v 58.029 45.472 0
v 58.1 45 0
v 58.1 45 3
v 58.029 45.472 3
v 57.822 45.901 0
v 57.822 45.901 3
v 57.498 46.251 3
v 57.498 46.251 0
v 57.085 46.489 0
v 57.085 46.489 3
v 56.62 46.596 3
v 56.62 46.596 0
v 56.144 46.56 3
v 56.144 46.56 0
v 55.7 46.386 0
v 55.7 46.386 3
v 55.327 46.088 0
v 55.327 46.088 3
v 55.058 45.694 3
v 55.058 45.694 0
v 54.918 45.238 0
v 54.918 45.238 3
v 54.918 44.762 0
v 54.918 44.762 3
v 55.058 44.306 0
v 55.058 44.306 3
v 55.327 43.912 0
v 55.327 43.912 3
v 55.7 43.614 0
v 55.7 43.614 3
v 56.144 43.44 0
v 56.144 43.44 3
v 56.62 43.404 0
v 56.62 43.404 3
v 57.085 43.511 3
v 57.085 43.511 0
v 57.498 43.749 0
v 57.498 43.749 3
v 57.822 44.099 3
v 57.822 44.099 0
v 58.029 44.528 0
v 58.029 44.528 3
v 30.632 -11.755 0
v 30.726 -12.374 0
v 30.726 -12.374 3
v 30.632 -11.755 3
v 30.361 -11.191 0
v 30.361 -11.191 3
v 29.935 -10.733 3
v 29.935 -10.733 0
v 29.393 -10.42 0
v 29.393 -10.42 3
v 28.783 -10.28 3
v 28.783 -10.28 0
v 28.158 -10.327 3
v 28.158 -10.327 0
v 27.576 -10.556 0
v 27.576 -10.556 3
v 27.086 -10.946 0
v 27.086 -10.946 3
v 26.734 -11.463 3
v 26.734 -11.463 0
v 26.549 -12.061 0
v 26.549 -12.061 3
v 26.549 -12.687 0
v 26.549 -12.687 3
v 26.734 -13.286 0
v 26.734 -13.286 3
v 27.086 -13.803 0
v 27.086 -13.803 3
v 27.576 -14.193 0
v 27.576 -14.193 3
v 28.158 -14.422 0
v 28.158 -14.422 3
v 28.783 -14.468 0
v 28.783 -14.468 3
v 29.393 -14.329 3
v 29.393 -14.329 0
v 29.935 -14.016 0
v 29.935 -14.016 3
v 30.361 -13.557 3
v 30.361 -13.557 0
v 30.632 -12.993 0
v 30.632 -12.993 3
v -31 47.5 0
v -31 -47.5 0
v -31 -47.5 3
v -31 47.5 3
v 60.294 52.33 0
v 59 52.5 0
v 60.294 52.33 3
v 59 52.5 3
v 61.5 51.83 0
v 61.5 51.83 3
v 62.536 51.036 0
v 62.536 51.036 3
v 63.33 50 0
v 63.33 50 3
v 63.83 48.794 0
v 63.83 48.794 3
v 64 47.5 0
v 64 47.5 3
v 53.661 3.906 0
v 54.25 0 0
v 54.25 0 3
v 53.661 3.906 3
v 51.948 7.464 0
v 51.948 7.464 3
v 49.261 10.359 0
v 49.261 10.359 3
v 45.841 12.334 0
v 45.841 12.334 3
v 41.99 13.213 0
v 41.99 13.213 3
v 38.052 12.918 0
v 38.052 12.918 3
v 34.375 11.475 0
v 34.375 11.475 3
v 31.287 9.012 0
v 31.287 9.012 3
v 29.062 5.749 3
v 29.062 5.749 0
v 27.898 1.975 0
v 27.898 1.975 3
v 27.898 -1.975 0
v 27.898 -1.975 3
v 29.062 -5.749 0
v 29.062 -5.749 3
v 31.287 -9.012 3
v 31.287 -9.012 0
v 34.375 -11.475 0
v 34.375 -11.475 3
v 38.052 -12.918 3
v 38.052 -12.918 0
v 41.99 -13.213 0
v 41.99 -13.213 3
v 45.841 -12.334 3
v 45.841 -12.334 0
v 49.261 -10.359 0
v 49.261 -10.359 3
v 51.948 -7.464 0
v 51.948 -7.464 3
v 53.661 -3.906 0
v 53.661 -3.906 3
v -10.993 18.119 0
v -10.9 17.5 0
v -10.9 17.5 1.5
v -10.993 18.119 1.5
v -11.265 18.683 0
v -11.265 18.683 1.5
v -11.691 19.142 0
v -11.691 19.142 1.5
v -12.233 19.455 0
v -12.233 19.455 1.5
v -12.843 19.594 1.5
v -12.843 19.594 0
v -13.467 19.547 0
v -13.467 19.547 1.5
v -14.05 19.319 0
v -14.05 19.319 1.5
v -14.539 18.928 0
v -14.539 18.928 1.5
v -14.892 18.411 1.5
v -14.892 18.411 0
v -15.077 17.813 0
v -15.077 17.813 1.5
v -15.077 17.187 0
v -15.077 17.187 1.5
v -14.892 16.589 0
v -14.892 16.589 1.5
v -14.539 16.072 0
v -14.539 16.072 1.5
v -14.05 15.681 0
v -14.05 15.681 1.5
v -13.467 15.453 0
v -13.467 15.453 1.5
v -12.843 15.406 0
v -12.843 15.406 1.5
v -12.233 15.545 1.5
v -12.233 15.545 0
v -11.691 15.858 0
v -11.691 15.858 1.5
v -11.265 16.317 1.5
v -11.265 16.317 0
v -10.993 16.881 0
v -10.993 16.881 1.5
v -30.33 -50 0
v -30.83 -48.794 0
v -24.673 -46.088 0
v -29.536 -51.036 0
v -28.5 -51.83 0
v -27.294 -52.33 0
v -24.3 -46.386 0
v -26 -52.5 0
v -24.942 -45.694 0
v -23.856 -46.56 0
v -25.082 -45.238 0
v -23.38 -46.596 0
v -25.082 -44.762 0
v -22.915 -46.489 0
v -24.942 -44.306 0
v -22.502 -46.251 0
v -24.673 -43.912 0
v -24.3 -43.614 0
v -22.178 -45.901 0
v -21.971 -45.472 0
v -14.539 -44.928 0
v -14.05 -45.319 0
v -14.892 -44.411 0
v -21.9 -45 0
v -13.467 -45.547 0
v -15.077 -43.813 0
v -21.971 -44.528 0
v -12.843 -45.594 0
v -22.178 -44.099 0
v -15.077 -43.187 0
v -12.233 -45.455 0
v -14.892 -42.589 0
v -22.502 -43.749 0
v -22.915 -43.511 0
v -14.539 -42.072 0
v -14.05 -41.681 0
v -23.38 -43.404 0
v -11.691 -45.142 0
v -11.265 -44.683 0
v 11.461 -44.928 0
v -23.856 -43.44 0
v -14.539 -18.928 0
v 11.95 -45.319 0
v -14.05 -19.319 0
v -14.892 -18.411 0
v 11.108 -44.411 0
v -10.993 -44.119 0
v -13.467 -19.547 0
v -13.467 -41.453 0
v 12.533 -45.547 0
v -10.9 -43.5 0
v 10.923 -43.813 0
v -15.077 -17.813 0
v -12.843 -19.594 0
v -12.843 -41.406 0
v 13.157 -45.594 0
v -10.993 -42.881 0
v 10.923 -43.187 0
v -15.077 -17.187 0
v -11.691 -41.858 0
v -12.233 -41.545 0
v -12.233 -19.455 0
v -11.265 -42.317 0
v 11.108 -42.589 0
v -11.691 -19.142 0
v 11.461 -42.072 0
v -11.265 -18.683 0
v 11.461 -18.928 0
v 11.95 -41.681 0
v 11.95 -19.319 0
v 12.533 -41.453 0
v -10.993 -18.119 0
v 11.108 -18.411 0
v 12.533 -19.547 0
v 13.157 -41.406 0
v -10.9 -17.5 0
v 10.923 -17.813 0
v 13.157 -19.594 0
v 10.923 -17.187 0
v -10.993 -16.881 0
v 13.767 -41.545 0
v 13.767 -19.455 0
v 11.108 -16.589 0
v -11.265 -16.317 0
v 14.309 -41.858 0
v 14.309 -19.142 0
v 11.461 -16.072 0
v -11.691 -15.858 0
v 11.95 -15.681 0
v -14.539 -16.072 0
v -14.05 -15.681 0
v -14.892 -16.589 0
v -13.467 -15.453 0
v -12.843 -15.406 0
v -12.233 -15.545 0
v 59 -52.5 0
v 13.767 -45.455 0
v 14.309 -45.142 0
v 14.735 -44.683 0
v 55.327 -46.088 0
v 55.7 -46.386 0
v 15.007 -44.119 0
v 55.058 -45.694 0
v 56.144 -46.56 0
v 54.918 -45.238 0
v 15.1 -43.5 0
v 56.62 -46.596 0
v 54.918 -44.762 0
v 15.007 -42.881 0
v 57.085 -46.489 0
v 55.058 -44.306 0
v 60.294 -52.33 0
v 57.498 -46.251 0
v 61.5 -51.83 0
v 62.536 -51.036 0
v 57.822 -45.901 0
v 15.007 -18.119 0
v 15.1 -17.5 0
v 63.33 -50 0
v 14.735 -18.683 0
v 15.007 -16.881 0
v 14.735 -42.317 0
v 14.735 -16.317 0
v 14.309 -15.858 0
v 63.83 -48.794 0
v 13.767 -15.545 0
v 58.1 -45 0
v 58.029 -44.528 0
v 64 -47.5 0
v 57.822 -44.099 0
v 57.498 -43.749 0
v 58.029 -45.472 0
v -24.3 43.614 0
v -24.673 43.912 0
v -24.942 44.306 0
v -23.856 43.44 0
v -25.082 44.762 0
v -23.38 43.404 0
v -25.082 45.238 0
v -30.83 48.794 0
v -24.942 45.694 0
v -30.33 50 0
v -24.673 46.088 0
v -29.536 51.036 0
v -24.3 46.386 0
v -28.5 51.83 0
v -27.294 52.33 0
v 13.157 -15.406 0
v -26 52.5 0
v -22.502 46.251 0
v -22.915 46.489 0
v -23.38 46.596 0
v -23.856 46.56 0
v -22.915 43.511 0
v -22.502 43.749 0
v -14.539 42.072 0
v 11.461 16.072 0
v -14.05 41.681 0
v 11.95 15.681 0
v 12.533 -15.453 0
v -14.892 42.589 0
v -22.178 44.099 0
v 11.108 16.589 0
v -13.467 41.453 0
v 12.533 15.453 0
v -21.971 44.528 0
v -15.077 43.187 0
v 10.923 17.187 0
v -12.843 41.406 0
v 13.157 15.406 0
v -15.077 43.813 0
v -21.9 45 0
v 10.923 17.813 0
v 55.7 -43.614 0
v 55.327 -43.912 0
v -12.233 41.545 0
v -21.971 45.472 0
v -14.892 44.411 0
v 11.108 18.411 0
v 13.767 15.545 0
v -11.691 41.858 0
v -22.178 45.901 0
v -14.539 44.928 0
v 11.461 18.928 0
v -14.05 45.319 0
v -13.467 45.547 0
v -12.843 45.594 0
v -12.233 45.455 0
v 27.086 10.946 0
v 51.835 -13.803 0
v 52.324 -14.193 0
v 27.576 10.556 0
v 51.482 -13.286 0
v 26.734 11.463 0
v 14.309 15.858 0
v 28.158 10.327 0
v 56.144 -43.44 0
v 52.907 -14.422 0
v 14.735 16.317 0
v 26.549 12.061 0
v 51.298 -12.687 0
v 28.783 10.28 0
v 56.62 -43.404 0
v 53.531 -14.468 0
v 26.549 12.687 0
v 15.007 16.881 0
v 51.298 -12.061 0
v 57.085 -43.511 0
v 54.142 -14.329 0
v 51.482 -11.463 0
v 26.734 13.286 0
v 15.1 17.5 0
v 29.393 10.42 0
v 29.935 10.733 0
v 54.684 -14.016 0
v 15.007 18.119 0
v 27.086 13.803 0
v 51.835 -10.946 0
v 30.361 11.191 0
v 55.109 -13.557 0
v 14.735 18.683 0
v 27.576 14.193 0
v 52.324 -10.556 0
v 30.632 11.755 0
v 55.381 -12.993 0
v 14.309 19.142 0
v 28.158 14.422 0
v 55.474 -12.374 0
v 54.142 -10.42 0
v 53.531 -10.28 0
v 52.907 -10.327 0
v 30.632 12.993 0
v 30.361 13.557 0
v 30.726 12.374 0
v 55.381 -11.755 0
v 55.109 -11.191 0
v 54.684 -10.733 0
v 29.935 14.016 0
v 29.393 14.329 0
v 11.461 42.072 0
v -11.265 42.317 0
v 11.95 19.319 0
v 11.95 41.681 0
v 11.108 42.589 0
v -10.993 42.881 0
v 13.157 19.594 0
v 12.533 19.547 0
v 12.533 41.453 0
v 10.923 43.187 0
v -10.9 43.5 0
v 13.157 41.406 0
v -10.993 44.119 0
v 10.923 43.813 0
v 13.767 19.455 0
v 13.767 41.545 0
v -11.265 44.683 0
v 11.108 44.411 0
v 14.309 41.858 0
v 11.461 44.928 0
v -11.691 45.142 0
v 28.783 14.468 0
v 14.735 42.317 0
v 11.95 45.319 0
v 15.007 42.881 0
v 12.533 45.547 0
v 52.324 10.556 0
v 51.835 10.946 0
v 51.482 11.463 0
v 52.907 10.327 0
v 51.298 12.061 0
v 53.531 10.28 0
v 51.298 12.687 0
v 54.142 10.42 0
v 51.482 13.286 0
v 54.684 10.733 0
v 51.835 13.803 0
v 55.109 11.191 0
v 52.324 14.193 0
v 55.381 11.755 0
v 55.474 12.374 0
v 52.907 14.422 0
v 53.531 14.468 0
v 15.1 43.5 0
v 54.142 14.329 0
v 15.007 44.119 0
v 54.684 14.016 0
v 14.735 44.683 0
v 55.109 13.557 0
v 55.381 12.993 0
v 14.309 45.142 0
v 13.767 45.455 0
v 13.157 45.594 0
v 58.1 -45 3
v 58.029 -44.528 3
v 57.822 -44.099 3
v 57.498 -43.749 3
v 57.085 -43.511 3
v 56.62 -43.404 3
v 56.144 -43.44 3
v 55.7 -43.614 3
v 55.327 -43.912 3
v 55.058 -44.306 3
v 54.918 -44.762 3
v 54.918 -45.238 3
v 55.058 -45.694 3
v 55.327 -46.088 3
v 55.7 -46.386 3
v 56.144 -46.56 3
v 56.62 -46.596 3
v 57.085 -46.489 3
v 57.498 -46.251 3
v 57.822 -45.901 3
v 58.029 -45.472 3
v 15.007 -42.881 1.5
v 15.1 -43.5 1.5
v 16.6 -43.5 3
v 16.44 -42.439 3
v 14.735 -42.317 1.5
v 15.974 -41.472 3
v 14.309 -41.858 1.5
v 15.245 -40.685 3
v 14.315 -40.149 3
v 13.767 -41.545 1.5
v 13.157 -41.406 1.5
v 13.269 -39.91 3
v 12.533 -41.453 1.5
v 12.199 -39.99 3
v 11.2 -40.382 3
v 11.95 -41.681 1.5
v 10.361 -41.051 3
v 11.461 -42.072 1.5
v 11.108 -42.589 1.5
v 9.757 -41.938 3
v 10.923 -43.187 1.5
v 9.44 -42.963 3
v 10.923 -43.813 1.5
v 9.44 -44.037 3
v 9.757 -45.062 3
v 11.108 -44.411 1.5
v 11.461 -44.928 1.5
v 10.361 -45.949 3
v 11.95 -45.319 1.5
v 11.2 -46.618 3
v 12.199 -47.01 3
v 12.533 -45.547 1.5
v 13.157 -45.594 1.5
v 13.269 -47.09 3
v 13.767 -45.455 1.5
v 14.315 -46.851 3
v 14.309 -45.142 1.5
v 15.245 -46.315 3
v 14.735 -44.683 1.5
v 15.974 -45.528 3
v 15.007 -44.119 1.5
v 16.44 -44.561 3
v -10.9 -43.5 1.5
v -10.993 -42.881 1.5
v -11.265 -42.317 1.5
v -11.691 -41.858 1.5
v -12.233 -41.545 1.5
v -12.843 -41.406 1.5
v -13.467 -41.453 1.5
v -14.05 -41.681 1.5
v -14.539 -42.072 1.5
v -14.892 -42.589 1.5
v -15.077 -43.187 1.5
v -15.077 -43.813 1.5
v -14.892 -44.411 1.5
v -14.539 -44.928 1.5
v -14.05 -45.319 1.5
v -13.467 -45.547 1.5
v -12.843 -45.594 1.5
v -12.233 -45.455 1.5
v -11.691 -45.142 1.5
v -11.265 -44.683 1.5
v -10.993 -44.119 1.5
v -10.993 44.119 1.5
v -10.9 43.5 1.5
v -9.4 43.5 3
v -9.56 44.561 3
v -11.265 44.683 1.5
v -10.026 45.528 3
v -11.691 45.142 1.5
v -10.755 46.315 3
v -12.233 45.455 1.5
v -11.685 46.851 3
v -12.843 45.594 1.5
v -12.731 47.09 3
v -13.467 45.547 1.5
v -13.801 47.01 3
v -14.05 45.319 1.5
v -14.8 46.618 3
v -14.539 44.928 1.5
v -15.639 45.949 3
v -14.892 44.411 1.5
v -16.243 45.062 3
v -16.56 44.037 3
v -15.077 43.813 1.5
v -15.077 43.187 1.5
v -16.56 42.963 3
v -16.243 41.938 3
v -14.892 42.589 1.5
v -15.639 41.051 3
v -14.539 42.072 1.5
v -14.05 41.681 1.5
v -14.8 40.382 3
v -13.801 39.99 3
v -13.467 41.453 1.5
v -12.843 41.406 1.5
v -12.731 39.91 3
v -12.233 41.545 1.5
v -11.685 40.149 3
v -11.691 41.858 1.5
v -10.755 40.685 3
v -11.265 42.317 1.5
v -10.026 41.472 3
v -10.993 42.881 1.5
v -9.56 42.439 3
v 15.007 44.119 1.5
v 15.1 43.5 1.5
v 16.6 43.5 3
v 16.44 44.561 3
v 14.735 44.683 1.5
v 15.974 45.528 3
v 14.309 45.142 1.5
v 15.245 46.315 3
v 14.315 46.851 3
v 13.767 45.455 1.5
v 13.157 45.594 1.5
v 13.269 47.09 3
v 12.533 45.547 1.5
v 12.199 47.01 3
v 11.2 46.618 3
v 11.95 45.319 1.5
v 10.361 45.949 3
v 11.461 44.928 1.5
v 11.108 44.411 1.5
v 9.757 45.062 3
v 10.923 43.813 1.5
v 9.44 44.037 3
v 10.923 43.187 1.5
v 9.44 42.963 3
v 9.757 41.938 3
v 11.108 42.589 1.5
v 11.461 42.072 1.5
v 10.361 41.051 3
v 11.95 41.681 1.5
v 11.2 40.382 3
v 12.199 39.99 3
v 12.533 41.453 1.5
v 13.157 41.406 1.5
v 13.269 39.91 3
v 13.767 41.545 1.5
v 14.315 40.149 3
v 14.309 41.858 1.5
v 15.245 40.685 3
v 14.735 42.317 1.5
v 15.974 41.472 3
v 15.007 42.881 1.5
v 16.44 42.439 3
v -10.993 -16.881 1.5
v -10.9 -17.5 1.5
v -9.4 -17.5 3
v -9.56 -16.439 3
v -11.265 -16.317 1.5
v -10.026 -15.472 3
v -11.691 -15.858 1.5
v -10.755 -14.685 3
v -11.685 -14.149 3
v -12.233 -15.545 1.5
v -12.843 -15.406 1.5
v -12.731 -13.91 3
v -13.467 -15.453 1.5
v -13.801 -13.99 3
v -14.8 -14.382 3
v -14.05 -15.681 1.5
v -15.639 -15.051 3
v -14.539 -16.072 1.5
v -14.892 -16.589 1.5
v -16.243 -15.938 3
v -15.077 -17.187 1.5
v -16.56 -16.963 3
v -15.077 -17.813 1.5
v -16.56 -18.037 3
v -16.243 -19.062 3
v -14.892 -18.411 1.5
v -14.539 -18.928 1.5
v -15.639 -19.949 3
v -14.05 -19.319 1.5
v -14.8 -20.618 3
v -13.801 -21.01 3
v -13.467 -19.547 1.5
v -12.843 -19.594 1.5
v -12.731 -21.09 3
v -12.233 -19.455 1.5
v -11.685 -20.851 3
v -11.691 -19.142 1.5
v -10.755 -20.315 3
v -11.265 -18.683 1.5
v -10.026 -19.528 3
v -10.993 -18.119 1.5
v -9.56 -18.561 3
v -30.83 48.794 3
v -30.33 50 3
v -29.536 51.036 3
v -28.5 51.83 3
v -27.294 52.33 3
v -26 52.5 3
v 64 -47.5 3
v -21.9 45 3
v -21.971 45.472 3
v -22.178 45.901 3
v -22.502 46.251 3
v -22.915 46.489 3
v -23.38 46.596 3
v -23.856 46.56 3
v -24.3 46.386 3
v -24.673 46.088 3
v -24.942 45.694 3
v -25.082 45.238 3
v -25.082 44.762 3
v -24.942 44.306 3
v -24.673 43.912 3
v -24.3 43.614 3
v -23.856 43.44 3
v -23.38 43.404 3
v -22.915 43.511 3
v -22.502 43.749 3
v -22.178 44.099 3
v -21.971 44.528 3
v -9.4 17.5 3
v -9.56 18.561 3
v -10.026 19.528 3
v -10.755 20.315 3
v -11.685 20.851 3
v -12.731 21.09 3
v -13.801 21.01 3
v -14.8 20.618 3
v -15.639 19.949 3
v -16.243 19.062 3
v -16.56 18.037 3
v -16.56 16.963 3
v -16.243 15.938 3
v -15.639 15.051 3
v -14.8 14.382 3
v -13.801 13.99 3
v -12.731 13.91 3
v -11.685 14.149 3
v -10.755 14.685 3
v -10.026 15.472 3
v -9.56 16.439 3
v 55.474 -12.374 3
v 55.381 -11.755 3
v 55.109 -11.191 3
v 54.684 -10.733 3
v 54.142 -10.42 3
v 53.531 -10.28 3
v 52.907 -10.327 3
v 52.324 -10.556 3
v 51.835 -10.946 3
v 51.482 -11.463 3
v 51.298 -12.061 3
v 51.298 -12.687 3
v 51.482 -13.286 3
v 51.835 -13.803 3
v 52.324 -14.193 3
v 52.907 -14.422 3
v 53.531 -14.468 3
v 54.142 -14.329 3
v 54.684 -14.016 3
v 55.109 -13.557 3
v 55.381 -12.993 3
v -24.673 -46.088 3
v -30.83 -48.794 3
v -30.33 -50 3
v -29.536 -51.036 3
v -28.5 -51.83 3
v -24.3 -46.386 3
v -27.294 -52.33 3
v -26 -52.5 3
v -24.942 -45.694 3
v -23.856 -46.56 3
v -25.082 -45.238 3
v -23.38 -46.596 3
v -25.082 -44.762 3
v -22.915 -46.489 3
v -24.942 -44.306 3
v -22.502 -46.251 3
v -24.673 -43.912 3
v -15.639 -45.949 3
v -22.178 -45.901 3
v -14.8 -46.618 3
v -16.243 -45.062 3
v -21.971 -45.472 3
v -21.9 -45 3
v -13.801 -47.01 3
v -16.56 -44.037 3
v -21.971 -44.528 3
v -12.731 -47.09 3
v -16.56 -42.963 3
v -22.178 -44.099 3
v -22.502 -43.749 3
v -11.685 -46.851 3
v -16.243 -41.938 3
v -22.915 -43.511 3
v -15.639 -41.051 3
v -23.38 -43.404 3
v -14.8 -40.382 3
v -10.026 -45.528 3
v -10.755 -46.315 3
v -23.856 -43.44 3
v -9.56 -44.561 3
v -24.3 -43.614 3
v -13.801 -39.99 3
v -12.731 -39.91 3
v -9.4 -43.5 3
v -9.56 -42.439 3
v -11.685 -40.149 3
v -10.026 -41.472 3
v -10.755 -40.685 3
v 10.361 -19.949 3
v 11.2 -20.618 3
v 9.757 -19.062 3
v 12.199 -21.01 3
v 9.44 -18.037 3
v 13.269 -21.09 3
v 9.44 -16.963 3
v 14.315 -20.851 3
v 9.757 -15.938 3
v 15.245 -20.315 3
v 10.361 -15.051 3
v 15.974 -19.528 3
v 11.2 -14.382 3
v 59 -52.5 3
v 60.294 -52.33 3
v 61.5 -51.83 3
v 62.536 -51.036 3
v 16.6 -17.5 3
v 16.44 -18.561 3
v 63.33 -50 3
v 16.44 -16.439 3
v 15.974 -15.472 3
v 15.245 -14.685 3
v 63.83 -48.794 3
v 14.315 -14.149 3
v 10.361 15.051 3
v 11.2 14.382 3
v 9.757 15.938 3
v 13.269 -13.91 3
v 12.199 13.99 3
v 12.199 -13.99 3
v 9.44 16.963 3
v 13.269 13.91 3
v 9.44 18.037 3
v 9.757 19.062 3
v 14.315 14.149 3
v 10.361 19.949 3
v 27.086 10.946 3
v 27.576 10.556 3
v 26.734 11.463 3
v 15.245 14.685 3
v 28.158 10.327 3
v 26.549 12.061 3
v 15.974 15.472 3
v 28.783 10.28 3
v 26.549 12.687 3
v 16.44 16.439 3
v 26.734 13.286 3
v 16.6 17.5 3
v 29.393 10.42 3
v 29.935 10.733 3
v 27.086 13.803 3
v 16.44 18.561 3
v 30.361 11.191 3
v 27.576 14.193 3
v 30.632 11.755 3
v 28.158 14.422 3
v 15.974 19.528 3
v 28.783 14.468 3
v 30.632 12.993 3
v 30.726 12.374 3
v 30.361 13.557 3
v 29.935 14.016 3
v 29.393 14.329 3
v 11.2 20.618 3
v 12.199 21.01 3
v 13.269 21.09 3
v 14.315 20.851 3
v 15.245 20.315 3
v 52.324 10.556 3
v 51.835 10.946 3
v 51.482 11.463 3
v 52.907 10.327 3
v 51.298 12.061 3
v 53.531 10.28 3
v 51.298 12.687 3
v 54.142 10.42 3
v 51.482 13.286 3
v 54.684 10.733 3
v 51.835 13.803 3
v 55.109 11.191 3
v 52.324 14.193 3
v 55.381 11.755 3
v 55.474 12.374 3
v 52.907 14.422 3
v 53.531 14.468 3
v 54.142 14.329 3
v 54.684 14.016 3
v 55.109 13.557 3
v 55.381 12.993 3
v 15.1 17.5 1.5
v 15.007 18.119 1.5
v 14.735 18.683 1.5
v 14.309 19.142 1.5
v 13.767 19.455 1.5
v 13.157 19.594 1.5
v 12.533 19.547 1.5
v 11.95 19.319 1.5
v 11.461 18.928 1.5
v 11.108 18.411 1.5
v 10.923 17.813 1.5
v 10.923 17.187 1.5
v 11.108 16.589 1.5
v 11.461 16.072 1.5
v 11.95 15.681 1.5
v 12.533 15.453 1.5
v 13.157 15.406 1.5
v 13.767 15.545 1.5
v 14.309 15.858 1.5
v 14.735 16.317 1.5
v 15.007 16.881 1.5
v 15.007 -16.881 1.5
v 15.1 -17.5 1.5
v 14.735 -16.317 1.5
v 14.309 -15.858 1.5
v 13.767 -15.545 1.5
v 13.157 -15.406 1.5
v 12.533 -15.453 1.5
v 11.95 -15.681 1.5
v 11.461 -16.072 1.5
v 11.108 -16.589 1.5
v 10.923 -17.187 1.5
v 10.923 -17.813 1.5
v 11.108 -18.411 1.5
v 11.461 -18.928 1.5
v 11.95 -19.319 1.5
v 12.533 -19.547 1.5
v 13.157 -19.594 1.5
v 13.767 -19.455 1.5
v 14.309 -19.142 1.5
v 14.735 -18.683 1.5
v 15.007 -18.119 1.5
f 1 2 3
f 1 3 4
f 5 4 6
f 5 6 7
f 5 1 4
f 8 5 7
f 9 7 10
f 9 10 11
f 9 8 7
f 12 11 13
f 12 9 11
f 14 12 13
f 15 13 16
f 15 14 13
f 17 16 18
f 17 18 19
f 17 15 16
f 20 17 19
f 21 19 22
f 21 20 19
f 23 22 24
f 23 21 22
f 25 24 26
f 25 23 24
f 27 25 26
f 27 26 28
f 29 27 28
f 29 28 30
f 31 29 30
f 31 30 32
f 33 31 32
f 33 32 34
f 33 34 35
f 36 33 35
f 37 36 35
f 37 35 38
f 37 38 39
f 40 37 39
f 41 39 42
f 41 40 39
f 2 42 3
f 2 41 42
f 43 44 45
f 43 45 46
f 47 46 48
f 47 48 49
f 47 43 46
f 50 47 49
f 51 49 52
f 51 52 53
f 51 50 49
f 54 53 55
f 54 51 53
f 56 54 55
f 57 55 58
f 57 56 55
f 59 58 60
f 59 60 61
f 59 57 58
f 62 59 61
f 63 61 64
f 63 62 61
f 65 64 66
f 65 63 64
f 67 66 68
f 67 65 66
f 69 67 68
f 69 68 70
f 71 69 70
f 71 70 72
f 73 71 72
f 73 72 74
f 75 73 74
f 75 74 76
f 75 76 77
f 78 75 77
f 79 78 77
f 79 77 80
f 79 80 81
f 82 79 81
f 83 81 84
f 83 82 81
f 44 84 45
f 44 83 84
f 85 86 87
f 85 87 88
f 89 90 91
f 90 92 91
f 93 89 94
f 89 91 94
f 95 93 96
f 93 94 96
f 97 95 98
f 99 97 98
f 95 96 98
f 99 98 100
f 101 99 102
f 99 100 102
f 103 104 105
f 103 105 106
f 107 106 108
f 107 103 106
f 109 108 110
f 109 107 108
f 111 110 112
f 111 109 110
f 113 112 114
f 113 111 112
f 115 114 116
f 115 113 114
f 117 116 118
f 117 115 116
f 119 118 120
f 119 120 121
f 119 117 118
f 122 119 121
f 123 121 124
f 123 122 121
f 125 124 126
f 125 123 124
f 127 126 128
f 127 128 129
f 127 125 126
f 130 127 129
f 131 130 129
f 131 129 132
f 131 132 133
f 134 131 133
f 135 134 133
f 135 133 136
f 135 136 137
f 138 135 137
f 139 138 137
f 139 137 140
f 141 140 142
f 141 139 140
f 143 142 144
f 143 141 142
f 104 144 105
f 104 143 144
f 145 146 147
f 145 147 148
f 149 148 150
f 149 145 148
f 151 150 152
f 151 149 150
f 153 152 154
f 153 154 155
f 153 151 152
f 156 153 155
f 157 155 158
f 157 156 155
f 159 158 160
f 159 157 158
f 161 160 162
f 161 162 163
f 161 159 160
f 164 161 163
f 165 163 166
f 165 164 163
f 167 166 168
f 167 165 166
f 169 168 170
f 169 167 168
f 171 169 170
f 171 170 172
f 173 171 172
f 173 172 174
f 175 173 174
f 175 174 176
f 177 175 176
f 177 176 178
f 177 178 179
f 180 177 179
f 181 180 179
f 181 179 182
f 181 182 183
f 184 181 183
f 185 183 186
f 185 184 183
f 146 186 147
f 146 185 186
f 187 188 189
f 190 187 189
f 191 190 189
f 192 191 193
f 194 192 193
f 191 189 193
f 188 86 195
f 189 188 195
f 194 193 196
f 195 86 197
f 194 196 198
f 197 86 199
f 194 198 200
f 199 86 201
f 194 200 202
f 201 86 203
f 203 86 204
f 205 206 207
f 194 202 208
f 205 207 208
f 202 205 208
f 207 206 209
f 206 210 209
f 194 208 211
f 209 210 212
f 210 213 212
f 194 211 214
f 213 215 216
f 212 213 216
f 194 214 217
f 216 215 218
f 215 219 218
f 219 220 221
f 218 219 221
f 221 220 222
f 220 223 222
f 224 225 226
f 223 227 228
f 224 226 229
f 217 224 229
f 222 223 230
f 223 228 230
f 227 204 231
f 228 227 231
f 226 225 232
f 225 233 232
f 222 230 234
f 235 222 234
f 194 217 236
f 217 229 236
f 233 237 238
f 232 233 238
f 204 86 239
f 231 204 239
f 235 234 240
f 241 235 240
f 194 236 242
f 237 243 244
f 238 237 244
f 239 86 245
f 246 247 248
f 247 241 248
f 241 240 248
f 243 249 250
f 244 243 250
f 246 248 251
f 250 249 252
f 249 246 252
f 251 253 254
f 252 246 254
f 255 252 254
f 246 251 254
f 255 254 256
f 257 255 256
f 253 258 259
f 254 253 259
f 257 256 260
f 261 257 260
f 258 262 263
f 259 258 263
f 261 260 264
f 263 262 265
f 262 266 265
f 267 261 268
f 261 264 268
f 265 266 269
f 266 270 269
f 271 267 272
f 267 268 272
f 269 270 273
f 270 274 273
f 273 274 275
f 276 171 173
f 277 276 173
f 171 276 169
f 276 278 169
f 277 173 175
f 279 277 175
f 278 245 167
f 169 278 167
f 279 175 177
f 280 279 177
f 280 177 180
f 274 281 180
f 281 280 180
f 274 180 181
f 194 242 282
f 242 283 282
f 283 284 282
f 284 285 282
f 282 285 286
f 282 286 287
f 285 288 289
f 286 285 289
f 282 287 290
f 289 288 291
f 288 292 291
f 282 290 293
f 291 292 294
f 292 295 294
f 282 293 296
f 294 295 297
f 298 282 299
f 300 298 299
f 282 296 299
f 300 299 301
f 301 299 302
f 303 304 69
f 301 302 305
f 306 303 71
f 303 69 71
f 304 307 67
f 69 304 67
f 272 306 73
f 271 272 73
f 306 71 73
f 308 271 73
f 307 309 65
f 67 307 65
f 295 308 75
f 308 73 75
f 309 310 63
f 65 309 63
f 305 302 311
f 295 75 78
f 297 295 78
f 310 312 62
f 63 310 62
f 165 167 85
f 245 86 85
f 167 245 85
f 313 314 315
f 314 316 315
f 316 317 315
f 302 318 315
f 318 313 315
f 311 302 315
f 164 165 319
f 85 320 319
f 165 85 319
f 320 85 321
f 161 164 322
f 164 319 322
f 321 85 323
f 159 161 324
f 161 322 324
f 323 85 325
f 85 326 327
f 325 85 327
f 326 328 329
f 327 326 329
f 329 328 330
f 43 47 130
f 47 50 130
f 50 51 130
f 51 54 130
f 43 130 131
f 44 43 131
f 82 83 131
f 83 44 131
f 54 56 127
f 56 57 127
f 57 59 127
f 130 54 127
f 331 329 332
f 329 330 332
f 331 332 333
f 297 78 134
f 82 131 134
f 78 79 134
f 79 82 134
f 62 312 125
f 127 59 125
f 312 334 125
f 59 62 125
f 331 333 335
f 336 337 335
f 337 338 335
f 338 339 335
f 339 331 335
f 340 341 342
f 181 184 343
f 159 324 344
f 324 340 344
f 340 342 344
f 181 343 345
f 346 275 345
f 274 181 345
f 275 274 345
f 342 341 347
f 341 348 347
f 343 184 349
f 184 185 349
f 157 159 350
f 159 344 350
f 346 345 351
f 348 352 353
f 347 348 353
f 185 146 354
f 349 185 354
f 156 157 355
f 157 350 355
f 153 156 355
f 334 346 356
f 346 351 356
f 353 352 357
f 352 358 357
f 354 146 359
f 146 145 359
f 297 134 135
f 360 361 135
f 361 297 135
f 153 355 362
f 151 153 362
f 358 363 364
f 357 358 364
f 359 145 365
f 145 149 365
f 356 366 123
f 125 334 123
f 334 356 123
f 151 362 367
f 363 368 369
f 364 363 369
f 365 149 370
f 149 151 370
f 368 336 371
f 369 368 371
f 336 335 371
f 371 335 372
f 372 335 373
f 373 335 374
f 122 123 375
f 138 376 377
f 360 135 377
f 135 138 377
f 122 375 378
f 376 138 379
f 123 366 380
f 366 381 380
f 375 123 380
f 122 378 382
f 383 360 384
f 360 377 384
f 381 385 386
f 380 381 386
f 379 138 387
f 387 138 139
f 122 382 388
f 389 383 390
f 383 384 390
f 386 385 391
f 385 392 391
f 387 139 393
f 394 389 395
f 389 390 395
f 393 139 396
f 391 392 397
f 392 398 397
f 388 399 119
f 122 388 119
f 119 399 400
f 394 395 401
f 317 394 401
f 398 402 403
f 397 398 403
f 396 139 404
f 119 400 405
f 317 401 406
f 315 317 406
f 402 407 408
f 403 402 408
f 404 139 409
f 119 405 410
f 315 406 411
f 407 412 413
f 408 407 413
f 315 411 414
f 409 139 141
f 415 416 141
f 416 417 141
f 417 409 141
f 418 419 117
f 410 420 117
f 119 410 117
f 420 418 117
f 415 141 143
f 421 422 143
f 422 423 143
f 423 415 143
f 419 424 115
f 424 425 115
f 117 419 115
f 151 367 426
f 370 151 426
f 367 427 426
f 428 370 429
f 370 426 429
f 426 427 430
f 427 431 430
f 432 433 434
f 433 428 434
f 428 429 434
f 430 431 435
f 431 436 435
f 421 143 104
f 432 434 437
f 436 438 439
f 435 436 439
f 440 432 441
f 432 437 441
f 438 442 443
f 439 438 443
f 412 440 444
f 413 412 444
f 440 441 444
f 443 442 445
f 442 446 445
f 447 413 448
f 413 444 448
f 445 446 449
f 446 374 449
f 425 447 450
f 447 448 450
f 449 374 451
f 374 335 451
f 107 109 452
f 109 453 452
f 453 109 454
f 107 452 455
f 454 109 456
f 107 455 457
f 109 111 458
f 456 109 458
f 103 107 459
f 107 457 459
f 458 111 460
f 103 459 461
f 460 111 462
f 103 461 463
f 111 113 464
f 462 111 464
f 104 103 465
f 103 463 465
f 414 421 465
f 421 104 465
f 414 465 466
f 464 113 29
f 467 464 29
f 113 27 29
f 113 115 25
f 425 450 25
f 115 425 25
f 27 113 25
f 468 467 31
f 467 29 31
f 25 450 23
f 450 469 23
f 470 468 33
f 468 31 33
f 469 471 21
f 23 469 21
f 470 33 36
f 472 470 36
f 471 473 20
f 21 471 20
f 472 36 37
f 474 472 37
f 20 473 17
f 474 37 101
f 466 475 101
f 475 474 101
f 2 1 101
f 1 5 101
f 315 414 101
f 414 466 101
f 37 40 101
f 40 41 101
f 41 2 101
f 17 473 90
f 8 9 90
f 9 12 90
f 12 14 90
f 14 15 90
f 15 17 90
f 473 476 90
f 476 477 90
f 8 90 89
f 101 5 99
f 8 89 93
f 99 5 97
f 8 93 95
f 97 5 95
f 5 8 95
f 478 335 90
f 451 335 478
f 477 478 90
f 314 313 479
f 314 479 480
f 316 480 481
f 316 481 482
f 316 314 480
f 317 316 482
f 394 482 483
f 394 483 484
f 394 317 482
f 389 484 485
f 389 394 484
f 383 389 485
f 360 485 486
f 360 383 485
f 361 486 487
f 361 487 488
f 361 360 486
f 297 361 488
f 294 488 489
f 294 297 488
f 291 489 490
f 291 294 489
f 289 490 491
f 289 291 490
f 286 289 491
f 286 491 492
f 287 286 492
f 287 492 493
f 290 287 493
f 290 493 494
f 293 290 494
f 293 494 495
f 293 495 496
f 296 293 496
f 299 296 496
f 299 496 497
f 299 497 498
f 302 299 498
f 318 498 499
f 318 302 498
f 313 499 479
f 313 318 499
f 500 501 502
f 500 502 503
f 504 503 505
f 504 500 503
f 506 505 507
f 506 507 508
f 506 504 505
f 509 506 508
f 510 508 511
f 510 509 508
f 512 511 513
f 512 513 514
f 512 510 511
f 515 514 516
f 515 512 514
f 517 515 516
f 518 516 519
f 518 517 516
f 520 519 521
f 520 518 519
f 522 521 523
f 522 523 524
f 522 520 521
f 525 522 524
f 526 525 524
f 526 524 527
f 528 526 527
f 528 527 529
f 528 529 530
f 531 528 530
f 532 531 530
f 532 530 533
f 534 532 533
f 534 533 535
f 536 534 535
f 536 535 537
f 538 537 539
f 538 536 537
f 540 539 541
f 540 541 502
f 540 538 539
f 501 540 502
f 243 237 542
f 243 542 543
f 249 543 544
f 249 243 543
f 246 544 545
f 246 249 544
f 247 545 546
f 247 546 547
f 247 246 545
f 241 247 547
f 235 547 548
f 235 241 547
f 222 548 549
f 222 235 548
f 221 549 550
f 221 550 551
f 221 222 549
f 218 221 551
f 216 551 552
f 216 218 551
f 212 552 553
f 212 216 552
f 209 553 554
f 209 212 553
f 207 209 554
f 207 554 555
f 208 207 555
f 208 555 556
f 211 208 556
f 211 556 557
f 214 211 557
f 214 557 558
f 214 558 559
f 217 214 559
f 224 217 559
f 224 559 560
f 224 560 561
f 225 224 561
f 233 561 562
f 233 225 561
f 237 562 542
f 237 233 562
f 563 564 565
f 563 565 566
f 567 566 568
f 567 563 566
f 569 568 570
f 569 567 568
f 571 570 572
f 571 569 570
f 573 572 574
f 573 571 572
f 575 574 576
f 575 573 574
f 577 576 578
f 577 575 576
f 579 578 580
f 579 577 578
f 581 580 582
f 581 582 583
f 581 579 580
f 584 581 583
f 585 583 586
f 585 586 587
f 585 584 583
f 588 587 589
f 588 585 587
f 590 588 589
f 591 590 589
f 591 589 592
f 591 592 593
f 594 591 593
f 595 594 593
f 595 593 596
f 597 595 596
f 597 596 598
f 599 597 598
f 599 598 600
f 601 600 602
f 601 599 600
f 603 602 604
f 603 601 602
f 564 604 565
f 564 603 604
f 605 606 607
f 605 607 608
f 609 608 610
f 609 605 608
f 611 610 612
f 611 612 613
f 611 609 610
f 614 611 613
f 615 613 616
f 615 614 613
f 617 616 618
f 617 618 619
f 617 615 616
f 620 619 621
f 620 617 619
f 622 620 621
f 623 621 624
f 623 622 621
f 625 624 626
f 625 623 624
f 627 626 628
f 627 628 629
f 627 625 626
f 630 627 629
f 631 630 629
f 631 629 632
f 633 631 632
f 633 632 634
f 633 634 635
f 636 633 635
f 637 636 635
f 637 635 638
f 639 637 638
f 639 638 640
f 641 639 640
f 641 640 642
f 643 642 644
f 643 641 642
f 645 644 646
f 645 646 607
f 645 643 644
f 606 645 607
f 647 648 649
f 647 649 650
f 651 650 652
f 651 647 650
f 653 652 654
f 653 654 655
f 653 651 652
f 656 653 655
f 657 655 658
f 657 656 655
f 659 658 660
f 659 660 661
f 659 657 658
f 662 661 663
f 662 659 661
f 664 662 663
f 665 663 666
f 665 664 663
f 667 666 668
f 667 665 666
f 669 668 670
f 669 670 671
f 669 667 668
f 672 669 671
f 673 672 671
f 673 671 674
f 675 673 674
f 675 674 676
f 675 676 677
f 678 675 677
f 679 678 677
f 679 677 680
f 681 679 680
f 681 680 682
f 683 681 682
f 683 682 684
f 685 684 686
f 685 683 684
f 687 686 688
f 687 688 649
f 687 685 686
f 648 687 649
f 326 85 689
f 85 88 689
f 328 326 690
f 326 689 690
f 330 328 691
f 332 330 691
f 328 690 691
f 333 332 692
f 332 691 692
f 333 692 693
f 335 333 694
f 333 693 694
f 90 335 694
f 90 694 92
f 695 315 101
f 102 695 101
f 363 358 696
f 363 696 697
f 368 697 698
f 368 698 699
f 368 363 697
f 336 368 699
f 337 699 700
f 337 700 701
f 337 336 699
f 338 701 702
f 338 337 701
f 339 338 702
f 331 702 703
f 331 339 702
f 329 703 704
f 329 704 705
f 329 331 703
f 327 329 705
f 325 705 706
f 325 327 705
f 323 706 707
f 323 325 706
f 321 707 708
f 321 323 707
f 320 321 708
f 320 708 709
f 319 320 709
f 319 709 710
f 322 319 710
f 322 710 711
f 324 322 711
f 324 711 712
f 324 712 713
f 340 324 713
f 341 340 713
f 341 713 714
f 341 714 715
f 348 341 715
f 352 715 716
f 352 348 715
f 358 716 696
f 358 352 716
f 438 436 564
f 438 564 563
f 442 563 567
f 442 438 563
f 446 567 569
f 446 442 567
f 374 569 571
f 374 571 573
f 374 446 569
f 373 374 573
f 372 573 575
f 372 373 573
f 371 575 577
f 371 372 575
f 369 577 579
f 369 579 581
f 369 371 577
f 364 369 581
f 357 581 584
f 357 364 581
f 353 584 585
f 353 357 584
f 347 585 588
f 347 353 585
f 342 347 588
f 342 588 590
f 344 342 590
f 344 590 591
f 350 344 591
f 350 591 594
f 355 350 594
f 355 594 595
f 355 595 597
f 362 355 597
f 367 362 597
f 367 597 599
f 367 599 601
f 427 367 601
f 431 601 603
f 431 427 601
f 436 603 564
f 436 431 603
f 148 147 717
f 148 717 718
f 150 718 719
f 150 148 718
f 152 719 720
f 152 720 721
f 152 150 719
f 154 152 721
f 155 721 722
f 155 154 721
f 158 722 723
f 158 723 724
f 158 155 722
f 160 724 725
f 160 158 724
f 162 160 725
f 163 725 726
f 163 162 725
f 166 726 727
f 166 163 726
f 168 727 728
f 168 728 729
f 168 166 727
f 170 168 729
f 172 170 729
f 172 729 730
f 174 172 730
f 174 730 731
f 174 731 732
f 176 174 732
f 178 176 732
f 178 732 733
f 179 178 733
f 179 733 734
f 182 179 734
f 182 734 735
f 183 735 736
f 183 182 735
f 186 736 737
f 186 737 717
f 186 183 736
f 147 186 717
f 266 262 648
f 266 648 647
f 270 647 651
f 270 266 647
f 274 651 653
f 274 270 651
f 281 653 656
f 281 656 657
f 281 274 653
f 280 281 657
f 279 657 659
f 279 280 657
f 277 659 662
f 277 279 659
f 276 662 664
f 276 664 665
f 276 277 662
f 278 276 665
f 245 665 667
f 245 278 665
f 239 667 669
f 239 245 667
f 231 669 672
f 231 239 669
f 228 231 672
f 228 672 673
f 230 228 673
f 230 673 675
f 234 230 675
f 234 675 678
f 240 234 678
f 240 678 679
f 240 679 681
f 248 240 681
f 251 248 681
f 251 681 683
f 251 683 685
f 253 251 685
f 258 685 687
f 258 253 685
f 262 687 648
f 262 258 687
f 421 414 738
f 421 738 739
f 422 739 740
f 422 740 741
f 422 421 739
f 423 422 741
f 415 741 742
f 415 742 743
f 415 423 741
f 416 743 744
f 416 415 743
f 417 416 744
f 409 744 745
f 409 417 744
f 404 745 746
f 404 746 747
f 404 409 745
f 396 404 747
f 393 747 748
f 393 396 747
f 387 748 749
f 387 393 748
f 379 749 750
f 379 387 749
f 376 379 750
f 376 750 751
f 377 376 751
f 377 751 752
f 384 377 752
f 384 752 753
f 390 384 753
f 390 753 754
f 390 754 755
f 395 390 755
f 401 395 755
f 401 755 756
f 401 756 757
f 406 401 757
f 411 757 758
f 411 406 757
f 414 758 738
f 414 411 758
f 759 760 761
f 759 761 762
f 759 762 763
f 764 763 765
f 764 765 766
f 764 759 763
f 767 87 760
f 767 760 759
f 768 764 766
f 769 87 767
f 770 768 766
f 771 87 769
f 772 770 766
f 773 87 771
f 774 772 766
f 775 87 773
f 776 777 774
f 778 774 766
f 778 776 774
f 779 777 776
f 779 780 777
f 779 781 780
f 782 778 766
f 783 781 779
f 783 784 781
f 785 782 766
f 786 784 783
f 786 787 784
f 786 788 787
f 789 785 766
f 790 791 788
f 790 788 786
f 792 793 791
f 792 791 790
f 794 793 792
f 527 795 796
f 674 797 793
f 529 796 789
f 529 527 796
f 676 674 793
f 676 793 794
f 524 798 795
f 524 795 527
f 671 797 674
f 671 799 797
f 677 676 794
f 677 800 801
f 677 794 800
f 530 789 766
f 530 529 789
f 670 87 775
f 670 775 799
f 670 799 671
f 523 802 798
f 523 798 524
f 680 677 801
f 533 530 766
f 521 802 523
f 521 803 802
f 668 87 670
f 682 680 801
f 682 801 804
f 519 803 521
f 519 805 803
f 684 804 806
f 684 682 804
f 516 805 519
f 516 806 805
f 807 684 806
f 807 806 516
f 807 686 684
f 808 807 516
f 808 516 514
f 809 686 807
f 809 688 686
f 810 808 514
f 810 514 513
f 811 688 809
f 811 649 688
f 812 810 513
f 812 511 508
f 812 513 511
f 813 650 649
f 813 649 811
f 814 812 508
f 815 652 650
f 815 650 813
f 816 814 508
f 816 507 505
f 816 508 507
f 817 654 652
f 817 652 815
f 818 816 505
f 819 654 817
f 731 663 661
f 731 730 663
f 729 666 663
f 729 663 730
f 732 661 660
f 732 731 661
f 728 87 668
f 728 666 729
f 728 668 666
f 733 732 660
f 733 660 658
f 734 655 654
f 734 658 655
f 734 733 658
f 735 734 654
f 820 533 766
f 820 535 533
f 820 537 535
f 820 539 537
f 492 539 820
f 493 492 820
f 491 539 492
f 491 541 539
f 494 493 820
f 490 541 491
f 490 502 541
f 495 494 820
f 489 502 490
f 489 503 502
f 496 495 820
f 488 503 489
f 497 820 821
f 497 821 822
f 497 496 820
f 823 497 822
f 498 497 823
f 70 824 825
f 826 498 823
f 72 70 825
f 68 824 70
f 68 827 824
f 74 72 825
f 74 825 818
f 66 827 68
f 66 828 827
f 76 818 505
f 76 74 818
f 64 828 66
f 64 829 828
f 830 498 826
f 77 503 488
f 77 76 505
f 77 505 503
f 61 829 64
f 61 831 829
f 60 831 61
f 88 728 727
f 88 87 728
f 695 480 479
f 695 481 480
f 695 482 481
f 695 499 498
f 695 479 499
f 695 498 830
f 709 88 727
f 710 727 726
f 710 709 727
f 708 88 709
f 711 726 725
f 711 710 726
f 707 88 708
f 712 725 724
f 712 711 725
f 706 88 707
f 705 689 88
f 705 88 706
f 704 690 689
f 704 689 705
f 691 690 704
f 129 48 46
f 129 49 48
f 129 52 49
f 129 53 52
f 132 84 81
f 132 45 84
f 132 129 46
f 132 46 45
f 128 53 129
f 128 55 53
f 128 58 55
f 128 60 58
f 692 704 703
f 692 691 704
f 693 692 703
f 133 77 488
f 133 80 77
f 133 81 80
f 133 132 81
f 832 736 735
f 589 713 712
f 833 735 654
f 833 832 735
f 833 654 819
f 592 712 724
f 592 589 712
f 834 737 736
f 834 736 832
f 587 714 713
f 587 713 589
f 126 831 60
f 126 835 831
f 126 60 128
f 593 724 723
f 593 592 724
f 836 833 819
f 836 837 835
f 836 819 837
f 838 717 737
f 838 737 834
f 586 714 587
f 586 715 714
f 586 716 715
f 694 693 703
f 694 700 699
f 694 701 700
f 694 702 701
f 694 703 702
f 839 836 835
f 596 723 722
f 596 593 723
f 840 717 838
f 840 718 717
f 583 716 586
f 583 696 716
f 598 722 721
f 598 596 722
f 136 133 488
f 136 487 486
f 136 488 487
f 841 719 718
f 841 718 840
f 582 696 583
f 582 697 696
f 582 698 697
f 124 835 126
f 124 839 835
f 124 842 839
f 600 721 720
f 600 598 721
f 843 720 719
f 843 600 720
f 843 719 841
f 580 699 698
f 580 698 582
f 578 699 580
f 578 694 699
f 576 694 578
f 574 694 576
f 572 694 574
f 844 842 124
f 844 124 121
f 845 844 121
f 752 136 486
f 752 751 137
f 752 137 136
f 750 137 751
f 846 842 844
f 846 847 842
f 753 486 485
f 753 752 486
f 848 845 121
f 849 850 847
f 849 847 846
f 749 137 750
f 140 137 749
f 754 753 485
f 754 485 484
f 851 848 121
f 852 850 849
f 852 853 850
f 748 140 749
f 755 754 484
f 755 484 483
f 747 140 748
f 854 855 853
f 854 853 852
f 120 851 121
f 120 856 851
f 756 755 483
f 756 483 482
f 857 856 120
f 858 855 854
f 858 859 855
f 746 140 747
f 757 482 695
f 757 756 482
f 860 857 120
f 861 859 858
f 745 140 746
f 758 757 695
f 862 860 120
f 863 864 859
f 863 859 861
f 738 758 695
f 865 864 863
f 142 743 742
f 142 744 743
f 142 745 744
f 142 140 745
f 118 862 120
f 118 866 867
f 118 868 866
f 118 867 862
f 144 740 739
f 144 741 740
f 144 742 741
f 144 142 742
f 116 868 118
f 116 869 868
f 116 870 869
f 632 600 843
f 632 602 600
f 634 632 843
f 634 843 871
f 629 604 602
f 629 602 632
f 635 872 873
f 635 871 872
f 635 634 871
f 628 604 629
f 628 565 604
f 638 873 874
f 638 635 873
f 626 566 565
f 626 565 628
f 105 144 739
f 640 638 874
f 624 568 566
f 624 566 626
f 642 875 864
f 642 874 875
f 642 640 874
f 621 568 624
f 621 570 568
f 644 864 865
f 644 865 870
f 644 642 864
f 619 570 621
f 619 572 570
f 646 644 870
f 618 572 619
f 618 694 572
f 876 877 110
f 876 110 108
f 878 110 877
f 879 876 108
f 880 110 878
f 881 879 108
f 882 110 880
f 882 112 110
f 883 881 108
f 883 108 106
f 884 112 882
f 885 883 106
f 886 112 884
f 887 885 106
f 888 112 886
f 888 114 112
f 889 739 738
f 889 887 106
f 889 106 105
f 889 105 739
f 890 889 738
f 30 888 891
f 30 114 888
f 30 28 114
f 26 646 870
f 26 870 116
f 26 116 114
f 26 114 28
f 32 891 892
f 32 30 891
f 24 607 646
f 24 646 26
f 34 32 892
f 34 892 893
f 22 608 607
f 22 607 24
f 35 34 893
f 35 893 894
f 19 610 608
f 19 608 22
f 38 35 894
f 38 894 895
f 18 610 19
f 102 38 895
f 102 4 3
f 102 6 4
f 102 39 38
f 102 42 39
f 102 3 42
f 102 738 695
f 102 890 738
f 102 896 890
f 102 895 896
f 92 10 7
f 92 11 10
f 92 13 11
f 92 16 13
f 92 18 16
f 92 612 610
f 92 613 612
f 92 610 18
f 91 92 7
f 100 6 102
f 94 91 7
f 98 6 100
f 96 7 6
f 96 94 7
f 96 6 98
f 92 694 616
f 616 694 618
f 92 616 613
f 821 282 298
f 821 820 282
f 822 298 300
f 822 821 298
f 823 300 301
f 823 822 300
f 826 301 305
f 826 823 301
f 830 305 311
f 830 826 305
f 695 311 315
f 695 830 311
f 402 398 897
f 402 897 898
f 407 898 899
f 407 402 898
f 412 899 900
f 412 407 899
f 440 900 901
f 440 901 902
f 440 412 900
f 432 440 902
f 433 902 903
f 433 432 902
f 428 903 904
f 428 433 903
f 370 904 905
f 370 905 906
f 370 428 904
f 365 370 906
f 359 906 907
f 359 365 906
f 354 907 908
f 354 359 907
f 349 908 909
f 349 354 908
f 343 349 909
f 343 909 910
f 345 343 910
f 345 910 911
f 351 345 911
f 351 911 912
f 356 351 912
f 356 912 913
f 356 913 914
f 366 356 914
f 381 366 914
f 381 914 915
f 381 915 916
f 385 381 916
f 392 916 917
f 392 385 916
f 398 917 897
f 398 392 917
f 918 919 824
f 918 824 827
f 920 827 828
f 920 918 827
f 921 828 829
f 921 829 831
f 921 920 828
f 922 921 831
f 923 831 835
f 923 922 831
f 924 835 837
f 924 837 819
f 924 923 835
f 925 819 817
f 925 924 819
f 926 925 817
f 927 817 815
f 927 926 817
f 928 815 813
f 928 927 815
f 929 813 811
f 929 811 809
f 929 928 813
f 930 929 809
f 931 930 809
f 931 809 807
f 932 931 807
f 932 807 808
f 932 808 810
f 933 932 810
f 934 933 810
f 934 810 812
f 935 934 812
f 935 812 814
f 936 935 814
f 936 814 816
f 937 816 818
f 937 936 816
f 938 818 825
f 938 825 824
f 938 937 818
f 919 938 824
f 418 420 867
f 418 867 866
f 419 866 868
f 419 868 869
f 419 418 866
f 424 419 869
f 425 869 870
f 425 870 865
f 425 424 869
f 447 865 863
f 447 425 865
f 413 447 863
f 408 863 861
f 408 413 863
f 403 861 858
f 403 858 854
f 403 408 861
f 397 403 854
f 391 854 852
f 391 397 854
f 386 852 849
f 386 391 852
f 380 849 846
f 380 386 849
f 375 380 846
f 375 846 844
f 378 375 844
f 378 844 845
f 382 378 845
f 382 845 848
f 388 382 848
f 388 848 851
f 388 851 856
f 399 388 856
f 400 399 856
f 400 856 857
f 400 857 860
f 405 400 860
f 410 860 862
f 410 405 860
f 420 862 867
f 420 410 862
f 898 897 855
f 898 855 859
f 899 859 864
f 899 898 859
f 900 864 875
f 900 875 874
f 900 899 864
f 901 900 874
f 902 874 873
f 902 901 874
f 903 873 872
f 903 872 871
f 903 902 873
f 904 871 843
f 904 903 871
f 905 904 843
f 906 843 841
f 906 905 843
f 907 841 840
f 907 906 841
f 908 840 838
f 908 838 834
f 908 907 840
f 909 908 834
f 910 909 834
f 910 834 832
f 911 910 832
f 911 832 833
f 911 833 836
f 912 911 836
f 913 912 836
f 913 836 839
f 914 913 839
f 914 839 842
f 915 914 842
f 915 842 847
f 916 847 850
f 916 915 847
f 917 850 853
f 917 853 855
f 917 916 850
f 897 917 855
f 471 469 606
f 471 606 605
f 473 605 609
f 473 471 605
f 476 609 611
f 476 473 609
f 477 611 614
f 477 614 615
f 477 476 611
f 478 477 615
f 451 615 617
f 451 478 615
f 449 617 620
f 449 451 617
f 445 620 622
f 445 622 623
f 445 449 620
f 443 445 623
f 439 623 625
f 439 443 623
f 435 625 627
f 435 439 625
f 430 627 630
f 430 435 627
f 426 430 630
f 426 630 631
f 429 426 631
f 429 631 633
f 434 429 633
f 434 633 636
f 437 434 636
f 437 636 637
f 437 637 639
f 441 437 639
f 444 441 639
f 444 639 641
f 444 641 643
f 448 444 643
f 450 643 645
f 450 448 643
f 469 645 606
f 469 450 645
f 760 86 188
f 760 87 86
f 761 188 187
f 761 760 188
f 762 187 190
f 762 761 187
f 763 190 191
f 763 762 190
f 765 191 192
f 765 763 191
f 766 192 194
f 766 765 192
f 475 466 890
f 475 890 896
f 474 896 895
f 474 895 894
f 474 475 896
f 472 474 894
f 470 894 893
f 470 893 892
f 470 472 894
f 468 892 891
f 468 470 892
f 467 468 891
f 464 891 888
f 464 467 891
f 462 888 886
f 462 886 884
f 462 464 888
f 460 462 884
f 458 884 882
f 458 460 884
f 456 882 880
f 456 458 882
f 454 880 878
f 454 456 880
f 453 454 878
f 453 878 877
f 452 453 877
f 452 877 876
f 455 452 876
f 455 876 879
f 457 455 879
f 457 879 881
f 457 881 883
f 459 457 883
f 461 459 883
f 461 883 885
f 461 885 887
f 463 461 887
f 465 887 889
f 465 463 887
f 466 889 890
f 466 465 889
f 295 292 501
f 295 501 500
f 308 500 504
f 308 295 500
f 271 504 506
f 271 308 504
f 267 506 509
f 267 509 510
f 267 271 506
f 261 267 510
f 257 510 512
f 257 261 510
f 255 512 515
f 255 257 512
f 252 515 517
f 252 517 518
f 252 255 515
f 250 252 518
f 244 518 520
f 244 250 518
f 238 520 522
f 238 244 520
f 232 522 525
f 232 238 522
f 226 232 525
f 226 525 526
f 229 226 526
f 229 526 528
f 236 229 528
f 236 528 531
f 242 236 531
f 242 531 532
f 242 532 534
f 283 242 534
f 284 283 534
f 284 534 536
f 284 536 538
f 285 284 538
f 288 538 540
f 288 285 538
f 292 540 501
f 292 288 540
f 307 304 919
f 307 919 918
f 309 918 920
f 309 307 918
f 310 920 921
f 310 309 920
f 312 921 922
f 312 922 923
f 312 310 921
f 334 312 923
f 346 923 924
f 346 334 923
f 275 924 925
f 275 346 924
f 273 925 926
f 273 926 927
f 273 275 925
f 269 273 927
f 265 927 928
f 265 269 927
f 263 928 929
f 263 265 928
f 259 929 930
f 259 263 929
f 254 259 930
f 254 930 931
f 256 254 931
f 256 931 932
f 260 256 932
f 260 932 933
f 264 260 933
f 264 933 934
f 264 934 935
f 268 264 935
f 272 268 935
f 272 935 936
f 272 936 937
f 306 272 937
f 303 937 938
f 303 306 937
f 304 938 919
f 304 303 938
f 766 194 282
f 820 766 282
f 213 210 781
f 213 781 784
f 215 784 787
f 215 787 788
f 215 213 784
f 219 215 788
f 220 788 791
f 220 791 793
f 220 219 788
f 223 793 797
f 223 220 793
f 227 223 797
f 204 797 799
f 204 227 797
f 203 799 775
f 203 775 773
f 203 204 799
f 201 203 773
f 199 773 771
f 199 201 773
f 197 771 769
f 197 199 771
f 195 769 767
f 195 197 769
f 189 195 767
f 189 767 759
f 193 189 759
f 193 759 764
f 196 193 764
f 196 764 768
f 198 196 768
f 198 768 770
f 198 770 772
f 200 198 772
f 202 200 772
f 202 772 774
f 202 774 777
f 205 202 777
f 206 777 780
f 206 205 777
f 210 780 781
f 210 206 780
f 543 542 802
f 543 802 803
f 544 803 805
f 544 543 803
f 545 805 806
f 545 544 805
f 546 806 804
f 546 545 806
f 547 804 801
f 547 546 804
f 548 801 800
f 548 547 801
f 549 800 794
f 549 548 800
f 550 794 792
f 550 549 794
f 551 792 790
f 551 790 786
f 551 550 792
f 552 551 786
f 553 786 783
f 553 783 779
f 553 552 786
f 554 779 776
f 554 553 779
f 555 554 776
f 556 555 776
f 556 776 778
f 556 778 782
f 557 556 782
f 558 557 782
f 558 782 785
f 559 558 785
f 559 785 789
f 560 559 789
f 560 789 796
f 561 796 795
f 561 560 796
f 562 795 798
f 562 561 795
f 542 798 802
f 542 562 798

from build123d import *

# Parameters (mm, degrees)
SKETCH_2_W      = 95
SKETCH_2_H      = 105
SKETCH_2_R      = 2.1
SKETCH_2_R_2    = 13.25
SKETCH_2_R_3    = 1.6
EXTRUDE_1_DEPTH = 3
FILLET_1_R      = 5
CHAMFER_1_SIZE  = 1.5


with BuildPart() as part:
    # ｽｹｯﾁ2 → ﾎﾞｽ - 押し出し1 (new body)
    with BuildSketch(Plane.XY):
        with Locations((16.5, 0)):
            Rectangle(SKETCH_2_W, SKETCH_2_H)
        with Locations((-13, -17.5)):
            Circle(SKETCH_2_R, mode=Mode.SUBTRACT)
        with Locations((-13, -43.5)):
            Circle(SKETCH_2_R, mode=Mode.SUBTRACT)
        with Locations((13, -17.5)):
            Circle(SKETCH_2_R, mode=Mode.SUBTRACT)
        with Locations((13, -43.5)):
            Circle(SKETCH_2_R, mode=Mode.SUBTRACT)
        with Locations((41, 0)):
            Circle(SKETCH_2_R_2, mode=Mode.SUBTRACT)
        with Locations((53.374368671, 12.374368671)):
            Circle(SKETCH_2_R, mode=Mode.SUBTRACT)
        with Locations((28.625631329, -12.374368671)):
            Circle(SKETCH_2_R, mode=Mode.SUBTRACT)
        with Locations((53.374368671, -12.374368671)):
            Circle(SKETCH_2_R, mode=Mode.SUBTRACT)
        with Locations((28.625631329, 12.374368671)):
            Circle(SKETCH_2_R, mode=Mode.SUBTRACT)
        with Locations((-23.5, 45)):
            Circle(SKETCH_2_R_3, mode=Mode.SUBTRACT)
        with Locations((-23.5, -45)):
            Circle(SKETCH_2_R_3, mode=Mode.SUBTRACT)
        with Locations((56.5, -45)):
            Circle(SKETCH_2_R_3, mode=Mode.SUBTRACT)
        with Locations((56.5, 45)):
            Circle(SKETCH_2_R_3, mode=Mode.SUBTRACT)
        with Locations((-13, 17.5)):
            Circle(SKETCH_2_R, mode=Mode.SUBTRACT)
        with Locations((13, 17.5)):
            Circle(SKETCH_2_R, mode=Mode.SUBTRACT)
        with Locations((13, 43.5)):
            Circle(SKETCH_2_R, mode=Mode.SUBTRACT)
        with Locations((-13, 43.5)):
            Circle(SKETCH_2_R, mode=Mode.SUBTRACT)
    extrude(amount=EXTRUDE_1_DEPTH)

    # ﾌｨﾚｯﾄ1
    fillet_1_edges = [part.edges().sort_by_distance(p)[0] for p in [
        (64, -52.5, 1.5),
        (-31, -52.5, 1.5),
        (-31, 52.5, 1.5),
        (64, 52.5, 1.5),
    ]]
    fillet(fillet_1_edges, radius=FILLET_1_R)

    # 面取り1
    chamfer_1_edges = [part.edges().sort_by_distance(p)[0] for p in [
        (-15.1, -17.5, 3),
        (-15.1, -43.5, 3),
        (10.9, -17.5, 3),
        (10.9, -43.5, 3),
        (-15.1, 17.5, 3),
        (10.9, 17.5, 3),
        (10.9, 43.5, 3),
        (-15.1, 43.5, 3),
    ]]
    chamfer(chamfer_1_edges, length=CHAMFER_1_SIZE)


solid = part.part
